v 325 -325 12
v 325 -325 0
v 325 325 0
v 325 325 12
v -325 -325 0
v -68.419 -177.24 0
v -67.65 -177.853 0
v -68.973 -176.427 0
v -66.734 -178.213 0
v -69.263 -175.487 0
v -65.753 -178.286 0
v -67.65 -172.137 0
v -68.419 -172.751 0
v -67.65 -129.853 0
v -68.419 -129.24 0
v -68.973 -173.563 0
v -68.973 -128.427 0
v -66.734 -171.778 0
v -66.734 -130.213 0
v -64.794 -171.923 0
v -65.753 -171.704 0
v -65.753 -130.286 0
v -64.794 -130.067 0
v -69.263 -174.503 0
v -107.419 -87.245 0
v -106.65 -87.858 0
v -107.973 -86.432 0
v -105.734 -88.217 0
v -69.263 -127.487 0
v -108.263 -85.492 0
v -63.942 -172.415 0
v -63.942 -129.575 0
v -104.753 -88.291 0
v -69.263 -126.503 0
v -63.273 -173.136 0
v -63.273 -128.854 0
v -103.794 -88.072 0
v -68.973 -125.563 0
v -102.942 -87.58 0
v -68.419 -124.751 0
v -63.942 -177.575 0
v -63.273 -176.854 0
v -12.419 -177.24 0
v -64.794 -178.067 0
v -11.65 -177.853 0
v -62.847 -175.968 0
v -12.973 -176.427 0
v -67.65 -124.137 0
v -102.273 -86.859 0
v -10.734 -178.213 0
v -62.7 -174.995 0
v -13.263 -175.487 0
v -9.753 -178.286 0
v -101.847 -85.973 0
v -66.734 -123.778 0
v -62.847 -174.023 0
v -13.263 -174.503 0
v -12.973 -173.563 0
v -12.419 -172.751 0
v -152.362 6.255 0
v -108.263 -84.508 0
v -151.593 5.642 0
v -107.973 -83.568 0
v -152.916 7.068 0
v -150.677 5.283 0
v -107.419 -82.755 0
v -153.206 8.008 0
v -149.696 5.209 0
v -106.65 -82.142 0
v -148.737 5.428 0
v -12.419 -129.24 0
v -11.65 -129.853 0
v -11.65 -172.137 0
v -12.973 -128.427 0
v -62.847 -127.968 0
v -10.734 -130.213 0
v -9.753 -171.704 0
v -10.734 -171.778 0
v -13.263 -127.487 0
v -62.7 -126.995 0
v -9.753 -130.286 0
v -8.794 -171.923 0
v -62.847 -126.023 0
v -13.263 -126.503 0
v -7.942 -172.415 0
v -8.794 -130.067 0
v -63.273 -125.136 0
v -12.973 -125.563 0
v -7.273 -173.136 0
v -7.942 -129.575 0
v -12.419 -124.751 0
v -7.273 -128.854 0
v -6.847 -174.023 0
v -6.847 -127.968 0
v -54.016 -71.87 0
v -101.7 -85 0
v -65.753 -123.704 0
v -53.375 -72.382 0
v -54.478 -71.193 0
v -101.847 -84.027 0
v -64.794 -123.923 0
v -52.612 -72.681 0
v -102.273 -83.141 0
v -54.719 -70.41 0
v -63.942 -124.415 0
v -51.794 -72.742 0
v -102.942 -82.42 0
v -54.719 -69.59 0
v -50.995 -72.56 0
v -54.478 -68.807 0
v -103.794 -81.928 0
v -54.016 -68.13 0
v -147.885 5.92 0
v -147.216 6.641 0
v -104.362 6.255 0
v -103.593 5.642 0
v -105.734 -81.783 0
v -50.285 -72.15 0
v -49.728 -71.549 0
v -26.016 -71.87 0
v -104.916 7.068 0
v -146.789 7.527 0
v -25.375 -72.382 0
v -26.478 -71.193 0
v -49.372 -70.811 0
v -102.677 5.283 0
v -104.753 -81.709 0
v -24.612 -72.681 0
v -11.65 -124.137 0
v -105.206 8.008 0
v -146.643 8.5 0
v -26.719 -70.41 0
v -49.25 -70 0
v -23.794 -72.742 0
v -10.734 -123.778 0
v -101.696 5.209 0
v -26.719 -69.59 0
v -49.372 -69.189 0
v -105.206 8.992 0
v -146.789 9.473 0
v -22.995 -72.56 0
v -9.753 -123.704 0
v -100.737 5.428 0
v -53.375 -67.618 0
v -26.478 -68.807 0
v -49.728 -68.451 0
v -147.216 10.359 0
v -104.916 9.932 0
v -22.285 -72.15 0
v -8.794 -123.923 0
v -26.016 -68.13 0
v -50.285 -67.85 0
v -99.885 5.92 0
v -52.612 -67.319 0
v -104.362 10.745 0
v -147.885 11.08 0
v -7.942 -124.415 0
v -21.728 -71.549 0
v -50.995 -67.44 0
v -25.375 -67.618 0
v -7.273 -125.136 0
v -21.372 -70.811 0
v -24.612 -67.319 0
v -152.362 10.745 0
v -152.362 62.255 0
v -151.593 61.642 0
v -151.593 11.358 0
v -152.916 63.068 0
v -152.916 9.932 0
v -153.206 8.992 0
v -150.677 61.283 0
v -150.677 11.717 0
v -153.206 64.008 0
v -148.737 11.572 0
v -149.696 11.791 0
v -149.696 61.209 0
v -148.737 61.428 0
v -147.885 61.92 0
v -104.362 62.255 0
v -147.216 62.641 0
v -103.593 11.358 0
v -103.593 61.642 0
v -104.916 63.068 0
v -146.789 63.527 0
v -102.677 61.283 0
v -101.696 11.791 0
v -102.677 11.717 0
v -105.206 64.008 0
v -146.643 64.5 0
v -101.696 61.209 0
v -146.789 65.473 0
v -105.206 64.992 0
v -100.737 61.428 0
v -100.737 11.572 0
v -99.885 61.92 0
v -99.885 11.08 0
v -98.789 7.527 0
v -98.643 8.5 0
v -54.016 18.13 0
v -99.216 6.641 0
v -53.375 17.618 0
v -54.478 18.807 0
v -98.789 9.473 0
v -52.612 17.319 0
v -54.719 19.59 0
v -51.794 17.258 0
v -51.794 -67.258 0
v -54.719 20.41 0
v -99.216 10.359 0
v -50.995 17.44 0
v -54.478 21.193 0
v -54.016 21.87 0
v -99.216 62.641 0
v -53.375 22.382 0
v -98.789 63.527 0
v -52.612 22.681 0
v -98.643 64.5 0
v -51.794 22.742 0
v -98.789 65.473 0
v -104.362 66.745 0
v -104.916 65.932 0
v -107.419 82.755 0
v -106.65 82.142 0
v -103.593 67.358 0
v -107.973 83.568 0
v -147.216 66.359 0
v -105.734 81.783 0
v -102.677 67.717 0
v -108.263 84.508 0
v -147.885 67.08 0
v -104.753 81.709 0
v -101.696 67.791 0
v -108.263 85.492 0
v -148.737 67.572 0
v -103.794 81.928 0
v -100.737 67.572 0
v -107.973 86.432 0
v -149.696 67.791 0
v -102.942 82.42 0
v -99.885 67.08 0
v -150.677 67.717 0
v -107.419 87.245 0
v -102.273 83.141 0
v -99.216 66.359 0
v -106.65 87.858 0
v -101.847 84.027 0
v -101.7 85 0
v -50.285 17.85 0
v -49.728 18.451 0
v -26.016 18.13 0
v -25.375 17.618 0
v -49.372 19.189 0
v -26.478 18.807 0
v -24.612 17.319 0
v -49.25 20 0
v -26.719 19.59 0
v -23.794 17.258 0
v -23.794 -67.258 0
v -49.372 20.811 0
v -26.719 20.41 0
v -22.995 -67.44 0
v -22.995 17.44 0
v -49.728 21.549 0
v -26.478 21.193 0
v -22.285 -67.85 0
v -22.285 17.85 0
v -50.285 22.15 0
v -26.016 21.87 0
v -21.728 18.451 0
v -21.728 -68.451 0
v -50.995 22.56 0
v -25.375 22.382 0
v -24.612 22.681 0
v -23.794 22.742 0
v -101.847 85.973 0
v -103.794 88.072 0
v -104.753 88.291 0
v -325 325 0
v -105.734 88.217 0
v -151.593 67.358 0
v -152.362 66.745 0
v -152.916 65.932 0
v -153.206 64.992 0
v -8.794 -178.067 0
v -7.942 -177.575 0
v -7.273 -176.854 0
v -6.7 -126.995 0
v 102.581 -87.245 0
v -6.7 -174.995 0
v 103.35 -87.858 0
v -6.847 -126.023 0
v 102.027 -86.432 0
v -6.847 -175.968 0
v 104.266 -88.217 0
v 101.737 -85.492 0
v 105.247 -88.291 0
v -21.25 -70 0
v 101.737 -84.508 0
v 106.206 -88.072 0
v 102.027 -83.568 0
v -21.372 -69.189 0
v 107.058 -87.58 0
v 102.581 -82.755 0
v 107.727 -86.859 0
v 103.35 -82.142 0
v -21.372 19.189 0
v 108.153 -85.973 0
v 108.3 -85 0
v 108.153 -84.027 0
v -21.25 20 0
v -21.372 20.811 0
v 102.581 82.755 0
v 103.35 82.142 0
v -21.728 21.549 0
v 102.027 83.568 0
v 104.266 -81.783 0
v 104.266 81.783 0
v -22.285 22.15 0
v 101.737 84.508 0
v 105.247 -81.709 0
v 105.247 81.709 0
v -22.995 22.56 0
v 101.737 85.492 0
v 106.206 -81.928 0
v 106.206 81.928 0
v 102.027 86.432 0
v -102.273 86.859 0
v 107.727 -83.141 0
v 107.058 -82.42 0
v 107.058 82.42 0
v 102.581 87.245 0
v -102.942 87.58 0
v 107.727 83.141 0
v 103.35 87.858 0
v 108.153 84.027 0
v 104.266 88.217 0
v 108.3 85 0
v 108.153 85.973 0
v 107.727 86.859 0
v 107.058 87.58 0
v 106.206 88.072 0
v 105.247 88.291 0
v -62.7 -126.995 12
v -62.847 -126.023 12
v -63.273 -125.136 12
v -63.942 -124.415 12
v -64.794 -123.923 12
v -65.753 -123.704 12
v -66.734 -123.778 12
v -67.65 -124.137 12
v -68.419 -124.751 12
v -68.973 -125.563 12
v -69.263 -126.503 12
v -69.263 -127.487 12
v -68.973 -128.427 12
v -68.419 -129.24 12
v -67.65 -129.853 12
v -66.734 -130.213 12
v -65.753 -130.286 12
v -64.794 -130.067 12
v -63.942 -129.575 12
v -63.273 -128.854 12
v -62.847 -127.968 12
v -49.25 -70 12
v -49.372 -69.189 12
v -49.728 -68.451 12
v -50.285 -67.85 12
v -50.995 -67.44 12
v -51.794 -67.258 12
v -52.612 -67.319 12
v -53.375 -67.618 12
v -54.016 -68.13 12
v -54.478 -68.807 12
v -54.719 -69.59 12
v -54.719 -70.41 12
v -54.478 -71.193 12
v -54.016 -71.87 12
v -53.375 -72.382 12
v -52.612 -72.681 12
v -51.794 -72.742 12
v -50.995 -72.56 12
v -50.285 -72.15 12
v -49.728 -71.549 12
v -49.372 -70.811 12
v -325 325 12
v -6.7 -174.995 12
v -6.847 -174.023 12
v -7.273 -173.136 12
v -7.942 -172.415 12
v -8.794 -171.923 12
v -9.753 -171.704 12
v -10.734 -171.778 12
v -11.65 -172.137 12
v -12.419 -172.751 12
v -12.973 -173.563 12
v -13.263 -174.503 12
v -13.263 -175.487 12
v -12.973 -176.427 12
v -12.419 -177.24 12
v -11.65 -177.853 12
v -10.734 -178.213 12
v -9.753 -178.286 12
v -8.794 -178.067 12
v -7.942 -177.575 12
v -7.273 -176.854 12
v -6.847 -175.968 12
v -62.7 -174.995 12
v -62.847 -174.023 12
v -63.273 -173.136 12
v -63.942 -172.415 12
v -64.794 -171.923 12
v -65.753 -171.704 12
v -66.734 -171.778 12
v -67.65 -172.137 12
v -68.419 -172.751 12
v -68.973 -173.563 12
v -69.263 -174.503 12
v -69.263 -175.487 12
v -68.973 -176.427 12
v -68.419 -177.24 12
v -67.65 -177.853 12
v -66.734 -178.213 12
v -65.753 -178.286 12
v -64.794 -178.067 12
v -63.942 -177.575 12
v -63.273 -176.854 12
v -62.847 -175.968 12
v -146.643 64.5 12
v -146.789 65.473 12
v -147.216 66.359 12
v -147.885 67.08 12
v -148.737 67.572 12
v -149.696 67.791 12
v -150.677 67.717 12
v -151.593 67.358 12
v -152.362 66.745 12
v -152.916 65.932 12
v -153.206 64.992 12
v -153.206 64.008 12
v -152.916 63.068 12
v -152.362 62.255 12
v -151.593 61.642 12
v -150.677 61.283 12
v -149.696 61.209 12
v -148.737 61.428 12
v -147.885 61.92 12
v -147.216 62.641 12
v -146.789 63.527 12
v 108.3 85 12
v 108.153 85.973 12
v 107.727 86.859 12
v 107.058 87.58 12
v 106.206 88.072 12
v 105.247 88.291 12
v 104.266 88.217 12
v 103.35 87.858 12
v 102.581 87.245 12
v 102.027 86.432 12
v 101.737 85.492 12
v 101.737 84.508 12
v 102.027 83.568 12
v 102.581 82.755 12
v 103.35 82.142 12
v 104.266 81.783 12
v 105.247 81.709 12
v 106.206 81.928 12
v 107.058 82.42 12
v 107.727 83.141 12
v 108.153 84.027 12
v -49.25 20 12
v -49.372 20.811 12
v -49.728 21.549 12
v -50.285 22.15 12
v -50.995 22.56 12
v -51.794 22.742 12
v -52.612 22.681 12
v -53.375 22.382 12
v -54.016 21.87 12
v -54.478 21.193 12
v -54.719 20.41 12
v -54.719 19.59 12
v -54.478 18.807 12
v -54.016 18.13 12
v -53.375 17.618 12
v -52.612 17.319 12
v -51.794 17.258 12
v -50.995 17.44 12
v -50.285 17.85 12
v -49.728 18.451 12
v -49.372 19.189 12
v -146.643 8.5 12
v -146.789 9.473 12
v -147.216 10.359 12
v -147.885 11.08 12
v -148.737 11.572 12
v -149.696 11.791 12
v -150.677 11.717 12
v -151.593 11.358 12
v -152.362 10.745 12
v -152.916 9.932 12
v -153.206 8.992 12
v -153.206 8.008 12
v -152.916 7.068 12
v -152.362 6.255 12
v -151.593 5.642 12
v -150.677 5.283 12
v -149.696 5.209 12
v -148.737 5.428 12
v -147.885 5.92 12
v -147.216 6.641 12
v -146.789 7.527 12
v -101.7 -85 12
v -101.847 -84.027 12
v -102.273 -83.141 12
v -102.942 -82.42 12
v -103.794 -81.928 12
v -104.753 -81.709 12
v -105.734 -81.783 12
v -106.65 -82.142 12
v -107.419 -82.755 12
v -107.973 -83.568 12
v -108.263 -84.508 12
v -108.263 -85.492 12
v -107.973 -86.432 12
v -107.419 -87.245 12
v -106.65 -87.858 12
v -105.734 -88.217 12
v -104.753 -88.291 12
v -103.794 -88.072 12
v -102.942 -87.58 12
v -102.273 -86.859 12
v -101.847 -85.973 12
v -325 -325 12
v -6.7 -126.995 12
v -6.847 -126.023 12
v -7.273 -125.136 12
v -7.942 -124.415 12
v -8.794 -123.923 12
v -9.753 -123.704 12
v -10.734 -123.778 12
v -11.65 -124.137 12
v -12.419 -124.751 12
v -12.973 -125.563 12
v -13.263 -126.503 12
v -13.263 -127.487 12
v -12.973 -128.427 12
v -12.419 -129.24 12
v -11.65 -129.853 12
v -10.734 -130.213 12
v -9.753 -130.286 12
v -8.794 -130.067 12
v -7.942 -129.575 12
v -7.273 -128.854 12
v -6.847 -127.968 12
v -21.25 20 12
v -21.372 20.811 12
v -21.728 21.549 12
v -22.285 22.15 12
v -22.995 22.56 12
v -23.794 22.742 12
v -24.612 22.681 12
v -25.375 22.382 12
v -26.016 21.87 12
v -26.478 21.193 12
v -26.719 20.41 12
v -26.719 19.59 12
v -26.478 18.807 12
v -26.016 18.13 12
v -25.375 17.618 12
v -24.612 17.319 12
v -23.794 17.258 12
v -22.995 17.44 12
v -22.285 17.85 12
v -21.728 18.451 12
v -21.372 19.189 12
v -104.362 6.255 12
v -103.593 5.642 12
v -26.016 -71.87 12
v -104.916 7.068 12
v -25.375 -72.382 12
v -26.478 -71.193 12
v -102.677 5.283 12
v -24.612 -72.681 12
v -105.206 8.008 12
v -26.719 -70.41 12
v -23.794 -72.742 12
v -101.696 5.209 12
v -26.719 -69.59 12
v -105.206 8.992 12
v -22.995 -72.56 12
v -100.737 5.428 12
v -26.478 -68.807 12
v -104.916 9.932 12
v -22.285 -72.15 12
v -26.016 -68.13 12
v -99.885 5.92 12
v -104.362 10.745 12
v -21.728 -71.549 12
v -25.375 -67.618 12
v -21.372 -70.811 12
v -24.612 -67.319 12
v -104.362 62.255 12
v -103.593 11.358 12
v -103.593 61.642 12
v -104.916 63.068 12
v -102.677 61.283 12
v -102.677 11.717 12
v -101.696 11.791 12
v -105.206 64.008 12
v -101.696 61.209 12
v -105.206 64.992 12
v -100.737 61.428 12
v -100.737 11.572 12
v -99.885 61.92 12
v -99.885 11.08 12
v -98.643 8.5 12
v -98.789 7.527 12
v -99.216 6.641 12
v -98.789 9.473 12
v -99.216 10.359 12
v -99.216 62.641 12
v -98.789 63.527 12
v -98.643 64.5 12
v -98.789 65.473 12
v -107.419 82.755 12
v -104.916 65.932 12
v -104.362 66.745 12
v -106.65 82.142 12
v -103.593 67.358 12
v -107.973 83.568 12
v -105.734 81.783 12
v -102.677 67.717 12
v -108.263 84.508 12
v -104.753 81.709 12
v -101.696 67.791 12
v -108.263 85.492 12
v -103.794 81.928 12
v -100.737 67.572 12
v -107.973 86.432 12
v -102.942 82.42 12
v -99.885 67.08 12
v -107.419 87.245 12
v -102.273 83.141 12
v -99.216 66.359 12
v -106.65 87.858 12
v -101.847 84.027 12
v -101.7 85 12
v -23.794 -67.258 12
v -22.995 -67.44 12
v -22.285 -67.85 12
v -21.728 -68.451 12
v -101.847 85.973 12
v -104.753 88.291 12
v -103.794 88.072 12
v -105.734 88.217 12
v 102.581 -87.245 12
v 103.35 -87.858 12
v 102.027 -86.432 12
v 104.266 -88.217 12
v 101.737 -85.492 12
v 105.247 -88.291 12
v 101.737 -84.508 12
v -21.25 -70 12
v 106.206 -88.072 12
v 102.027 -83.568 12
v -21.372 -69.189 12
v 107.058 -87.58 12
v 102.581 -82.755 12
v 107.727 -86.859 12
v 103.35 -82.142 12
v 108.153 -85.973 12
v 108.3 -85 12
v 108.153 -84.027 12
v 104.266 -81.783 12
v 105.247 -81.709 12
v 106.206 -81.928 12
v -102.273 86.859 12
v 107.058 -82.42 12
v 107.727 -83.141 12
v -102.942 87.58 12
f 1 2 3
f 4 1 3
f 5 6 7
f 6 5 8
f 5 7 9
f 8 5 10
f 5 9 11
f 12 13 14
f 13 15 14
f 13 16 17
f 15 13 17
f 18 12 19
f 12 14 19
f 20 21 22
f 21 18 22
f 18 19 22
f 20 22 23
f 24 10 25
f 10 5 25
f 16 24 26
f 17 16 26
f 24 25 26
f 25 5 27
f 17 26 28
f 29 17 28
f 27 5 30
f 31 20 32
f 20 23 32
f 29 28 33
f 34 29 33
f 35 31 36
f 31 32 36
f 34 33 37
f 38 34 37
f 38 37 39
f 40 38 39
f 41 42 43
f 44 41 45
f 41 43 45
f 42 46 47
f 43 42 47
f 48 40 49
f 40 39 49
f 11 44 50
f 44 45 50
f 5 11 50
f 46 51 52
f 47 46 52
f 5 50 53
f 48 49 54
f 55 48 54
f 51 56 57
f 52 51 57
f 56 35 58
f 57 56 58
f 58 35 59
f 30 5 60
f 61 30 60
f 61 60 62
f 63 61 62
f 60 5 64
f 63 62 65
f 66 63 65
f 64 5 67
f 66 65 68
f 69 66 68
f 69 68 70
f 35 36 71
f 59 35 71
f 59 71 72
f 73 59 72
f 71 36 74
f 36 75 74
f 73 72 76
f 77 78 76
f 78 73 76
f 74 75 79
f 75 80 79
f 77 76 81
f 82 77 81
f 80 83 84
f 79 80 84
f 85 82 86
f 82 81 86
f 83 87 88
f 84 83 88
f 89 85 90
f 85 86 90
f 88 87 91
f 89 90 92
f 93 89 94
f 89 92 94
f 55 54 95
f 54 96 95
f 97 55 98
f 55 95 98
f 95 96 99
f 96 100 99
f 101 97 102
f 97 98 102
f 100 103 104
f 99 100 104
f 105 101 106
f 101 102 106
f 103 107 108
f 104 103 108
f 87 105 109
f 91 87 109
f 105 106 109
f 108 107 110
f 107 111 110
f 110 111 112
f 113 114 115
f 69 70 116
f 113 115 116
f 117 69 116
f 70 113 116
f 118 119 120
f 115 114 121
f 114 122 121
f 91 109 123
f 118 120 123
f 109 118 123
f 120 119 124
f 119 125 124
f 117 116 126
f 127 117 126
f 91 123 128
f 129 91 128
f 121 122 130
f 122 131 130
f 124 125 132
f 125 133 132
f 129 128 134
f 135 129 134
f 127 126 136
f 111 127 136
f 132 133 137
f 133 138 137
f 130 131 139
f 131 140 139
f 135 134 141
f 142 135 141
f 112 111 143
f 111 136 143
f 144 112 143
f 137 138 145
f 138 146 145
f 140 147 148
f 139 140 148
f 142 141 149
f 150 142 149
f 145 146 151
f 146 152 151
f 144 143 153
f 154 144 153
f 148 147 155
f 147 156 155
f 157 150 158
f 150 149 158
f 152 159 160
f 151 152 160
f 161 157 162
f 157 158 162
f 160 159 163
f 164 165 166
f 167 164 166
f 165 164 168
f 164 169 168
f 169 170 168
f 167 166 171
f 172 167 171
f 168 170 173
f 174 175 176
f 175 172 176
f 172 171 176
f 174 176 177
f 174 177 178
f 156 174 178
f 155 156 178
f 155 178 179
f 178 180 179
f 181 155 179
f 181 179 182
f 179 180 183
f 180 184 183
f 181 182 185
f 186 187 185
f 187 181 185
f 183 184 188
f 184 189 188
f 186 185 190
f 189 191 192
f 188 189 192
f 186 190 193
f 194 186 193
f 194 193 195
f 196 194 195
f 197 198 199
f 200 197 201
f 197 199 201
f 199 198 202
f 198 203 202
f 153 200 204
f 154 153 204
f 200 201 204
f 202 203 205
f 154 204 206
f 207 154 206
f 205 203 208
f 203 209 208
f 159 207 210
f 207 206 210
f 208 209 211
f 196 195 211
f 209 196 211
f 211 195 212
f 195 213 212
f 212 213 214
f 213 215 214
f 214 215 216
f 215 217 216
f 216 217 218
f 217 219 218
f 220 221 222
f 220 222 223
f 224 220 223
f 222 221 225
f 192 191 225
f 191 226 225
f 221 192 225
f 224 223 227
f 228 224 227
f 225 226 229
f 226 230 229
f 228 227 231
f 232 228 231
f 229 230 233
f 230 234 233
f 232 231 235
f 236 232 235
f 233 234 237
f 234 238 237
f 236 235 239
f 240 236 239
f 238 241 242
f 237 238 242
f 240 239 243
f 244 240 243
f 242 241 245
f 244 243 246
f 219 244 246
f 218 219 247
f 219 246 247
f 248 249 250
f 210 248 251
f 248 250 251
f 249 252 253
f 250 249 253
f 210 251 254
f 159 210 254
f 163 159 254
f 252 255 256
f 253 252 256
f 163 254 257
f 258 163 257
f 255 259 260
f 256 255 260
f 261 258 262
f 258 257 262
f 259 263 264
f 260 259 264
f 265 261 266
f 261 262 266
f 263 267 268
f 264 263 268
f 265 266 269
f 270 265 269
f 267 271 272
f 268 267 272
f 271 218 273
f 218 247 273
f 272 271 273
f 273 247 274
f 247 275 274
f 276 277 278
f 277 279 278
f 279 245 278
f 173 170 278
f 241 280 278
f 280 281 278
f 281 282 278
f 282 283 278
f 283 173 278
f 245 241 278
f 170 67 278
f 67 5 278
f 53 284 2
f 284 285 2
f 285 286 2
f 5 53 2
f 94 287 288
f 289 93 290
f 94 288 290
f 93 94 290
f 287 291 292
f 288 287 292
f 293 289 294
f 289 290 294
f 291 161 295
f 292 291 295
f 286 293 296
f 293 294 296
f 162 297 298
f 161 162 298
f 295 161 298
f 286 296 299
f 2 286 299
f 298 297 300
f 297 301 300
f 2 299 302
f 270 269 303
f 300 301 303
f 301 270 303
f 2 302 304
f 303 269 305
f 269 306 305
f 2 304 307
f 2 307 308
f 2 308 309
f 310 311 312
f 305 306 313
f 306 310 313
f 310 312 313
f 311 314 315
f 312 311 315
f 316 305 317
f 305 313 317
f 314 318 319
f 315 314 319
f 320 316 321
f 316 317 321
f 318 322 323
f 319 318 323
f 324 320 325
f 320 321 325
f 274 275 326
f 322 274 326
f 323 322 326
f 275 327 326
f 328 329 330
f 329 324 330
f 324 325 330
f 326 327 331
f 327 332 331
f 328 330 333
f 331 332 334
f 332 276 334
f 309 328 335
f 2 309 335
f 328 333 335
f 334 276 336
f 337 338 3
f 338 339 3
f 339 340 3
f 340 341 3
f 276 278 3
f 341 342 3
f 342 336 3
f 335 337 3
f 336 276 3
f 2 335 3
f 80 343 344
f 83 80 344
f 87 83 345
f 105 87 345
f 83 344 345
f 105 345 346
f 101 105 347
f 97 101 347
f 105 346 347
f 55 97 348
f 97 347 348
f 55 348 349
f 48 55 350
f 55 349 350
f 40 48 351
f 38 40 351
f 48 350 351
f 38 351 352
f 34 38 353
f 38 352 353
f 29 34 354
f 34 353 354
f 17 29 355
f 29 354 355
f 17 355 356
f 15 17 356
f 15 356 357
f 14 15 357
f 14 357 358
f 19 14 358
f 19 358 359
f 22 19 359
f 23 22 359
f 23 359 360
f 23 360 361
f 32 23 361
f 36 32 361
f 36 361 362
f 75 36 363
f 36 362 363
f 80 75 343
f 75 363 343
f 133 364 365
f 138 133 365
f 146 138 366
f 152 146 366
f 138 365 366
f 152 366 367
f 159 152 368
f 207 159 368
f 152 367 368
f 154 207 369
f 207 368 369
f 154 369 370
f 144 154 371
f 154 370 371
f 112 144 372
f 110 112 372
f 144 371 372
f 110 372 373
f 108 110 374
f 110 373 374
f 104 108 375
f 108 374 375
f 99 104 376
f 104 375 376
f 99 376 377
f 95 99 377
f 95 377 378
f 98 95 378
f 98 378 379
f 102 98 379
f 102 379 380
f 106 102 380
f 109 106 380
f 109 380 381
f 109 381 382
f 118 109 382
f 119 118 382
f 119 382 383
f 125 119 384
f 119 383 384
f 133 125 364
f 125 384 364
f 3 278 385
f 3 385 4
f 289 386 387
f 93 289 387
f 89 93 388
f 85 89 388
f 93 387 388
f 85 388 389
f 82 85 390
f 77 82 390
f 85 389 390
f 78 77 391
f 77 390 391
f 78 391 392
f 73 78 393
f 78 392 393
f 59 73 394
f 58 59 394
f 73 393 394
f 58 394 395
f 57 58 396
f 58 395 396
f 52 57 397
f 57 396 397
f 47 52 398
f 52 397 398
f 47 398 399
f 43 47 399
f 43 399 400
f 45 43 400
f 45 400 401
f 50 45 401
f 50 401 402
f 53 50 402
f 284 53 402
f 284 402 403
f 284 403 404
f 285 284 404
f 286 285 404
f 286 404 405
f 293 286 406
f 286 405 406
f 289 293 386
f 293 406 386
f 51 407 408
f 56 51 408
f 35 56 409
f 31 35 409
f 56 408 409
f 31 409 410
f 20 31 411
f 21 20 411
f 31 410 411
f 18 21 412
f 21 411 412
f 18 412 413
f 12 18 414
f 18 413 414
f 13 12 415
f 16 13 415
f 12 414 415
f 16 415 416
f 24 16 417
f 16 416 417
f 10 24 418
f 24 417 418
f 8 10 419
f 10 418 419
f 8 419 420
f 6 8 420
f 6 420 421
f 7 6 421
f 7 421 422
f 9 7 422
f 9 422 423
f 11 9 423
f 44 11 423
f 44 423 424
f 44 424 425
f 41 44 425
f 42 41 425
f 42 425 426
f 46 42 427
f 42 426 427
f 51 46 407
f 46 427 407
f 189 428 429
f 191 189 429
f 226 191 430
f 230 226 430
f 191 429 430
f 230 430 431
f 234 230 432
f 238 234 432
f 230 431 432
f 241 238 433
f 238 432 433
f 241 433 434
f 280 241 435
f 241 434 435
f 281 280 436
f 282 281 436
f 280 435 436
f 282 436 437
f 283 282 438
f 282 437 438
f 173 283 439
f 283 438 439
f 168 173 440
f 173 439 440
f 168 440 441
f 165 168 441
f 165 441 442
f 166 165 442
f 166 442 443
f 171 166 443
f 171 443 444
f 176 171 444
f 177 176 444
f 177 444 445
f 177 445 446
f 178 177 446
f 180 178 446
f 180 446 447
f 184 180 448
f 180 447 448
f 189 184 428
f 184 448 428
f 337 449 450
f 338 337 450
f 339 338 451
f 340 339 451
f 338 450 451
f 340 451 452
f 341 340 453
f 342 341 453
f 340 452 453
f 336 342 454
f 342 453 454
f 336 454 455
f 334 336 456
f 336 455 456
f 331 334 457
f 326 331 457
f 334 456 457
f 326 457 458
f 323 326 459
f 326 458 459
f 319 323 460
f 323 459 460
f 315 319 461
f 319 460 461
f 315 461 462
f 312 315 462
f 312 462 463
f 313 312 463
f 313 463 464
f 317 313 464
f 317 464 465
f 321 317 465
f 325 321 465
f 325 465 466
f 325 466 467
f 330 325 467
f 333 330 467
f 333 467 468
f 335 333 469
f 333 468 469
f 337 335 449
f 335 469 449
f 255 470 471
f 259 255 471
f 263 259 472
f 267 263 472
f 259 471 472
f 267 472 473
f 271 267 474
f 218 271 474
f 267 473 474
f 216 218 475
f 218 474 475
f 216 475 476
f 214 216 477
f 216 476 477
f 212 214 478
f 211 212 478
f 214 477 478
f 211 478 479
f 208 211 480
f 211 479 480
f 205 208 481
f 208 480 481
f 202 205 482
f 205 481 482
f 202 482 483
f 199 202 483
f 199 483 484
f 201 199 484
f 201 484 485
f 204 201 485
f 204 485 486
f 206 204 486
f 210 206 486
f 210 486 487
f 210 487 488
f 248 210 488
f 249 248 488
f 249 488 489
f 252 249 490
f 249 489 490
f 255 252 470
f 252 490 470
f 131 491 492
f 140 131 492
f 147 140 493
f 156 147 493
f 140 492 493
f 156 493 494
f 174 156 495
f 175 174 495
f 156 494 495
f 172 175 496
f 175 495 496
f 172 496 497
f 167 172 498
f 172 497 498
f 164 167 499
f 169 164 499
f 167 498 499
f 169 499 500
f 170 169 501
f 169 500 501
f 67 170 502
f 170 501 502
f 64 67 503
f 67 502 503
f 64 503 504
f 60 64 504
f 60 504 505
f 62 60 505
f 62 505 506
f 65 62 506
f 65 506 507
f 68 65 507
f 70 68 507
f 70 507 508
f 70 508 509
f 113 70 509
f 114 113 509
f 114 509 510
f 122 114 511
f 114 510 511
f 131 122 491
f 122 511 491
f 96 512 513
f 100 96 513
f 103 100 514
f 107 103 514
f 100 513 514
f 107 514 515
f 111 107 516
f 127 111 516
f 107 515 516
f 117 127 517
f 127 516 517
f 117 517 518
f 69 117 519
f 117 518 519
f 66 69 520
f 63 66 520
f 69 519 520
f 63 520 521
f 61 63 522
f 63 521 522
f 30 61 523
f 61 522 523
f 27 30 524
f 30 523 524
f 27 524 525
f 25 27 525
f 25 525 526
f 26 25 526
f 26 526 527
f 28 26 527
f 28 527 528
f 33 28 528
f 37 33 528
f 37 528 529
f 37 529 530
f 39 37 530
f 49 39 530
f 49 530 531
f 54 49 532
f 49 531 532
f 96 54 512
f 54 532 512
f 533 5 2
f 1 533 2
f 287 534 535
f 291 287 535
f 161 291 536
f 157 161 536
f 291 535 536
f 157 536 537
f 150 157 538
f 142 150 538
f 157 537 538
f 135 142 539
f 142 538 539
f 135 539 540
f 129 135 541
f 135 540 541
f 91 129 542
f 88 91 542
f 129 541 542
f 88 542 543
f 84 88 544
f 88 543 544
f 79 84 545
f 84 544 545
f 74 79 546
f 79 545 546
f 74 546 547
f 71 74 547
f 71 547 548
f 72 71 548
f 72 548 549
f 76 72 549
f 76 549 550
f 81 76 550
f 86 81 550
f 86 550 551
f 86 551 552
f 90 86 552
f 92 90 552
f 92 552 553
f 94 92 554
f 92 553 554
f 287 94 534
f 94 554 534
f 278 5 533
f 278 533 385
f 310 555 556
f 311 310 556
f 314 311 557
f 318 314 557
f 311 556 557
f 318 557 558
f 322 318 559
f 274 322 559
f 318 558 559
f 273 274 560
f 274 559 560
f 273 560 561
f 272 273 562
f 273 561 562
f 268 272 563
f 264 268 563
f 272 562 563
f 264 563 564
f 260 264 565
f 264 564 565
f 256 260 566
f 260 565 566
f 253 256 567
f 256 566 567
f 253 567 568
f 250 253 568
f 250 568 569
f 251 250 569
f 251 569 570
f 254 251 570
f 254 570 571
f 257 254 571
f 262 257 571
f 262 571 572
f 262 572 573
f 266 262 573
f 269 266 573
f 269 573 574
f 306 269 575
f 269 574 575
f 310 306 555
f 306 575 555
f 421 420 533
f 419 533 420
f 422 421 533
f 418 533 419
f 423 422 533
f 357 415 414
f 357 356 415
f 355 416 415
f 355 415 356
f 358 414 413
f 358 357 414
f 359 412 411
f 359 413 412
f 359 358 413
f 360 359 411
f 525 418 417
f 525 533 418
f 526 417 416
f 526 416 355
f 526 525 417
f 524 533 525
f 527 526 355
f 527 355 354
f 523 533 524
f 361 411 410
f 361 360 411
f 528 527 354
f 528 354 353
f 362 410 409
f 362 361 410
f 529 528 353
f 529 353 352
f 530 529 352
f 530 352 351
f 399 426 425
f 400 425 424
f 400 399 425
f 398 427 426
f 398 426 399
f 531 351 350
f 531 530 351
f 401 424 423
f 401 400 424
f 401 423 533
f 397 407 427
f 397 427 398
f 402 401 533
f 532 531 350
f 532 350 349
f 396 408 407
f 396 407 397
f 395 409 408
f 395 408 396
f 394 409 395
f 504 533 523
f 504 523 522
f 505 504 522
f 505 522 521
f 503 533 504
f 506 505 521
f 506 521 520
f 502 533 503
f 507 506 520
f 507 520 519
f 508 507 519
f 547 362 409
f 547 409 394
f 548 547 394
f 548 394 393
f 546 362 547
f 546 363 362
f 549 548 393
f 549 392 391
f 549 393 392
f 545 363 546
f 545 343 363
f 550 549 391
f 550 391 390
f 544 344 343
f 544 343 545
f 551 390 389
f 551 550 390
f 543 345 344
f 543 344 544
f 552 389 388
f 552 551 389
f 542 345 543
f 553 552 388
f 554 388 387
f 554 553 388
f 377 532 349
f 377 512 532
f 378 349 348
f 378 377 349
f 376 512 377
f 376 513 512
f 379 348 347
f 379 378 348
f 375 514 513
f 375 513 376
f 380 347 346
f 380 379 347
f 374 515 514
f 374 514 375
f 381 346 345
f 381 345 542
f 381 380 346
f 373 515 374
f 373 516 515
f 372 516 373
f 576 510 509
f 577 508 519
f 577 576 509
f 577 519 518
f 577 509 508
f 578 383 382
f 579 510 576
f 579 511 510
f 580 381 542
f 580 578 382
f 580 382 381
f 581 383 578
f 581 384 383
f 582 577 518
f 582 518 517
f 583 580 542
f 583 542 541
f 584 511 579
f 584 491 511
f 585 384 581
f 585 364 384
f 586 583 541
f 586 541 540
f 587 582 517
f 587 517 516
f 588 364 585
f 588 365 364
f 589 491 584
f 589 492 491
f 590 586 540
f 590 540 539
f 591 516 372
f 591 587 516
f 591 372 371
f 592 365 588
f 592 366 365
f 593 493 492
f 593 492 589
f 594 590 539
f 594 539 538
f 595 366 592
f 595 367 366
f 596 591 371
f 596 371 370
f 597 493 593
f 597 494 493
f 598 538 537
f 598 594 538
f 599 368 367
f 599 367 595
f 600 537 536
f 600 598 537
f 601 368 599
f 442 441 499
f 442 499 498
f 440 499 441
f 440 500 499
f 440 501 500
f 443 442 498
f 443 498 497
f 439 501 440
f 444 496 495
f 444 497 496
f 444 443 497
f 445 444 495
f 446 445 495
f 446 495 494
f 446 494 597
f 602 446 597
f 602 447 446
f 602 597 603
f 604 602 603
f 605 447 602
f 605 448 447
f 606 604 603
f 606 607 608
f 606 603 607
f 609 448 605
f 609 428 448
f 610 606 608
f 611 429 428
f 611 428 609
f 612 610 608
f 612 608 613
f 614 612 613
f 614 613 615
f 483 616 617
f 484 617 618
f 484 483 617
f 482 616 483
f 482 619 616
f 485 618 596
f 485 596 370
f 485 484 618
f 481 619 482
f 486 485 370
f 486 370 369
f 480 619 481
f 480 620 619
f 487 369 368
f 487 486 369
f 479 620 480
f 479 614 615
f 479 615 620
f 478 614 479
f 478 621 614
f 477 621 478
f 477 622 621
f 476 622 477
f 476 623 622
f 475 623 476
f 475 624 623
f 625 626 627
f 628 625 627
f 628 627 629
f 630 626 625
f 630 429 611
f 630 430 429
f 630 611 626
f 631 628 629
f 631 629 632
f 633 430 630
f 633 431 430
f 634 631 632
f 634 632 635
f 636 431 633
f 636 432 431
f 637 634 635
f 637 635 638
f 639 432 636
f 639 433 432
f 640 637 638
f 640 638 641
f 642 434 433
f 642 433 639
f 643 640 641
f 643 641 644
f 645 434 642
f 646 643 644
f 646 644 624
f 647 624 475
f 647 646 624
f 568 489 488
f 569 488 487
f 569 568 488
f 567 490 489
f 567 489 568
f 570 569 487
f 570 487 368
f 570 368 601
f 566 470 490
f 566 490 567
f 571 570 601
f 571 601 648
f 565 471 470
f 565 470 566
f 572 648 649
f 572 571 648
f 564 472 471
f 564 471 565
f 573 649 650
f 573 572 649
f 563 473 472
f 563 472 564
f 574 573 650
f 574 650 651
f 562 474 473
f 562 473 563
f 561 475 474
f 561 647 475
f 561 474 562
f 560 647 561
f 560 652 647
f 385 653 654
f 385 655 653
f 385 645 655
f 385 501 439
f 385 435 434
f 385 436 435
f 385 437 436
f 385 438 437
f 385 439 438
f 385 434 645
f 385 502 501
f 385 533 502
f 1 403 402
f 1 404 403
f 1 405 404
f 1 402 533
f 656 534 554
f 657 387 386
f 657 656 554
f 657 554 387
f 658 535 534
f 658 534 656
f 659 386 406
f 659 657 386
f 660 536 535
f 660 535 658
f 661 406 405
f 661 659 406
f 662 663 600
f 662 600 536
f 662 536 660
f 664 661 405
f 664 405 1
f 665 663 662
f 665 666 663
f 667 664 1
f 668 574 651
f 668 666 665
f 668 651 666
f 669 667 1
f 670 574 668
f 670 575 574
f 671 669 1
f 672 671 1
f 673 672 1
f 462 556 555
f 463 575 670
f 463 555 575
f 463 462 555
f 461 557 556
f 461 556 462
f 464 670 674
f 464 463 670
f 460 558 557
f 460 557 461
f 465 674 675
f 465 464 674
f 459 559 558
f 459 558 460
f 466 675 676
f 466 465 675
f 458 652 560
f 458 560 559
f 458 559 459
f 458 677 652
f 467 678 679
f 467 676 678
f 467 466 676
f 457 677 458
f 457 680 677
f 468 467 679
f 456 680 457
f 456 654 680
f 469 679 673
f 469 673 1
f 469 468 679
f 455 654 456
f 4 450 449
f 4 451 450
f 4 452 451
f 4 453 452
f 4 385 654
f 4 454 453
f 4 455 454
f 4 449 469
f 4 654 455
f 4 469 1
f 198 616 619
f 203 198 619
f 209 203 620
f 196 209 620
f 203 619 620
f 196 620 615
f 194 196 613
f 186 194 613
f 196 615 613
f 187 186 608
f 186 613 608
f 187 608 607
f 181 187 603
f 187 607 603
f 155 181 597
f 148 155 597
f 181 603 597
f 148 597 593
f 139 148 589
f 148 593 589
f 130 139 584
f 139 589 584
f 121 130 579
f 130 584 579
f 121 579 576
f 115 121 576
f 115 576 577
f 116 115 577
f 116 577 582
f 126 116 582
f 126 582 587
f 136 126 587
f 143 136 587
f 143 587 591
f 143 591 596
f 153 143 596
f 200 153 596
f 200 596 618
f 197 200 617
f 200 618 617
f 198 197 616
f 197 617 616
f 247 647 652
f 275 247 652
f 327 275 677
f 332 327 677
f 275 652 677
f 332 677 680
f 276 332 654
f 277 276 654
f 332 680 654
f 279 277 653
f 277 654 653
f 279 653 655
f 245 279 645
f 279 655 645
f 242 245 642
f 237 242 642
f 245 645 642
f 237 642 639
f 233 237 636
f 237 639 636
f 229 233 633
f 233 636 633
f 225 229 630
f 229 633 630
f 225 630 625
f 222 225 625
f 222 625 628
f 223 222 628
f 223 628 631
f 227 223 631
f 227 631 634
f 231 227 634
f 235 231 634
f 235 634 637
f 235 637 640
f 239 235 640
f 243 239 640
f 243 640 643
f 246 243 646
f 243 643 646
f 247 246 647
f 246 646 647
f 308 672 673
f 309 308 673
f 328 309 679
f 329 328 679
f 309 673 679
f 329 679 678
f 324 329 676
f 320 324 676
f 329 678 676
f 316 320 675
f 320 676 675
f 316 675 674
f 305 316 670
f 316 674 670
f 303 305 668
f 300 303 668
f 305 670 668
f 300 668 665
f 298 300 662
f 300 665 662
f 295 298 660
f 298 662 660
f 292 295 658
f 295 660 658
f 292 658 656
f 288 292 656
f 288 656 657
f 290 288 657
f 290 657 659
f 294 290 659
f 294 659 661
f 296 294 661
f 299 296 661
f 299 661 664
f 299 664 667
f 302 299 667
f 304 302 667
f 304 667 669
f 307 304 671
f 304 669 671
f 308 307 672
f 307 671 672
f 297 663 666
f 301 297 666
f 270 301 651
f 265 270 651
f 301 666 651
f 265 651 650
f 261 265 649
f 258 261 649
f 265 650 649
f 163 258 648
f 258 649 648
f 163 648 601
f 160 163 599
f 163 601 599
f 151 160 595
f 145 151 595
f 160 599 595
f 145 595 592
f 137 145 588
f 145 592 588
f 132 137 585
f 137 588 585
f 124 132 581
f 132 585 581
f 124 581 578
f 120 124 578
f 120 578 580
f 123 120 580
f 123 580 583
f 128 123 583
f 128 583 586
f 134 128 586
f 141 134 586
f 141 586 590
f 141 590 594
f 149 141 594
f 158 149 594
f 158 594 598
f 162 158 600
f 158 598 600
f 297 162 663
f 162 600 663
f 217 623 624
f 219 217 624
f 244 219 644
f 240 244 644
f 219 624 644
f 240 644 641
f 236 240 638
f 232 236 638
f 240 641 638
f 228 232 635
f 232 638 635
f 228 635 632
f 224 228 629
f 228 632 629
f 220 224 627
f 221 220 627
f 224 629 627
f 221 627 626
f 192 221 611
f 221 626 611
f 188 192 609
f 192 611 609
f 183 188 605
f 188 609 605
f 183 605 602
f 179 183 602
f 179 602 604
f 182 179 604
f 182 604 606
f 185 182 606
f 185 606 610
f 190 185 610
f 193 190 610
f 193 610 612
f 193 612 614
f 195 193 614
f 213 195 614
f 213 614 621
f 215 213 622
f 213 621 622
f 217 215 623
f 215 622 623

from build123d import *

# Parameters (mm, degrees)
SKETCH1_W                                = 650
SKETCH1_H                                = 650
BENCH_PLATE_DEPTH                        = 12
SKETCH2_R                                = 3.3
BENCH_M6_ANCHOR_HOLES_12X_D6P6_DEPTH     = 12
SKETCH3_R                                = 2.75
BENCH_M5_SUPPORTPOST_HOLES_4X_D5P5_DEPTH = 12


with BuildPart() as part:
    # Sketch1 → Bench_Plate (new body)
    with BuildSketch(Plane.XY):
        Rectangle(SKETCH1_W, SKETCH1_H)
    extrude(amount=BENCH_PLATE_DEPTH)

    # Sketch2 → Bench_M6_Anchor_Holes_12x_D6p6 (cut)
    with BuildSketch(Plane.XY.offset(12)):
        with Locations((-105, -85)):
            Circle(SKETCH2_R)
        with Locations((-105, 85)):
            Circle(SKETCH2_R)
        with Locations((105, -85)):
            Circle(SKETCH2_R)
        with Locations((105, 85)):
            Circle(SKETCH2_R)
        with Locations((-149.942838923, 8.5)):
            Circle(SKETCH2_R)
        with Locations((-101.942838923, 8.5)):
            Circle(SKETCH2_R)
        with Locations((-149.942838923, 64.5)):
            Circle(SKETCH2_R)
        with Locations((-101.942838923, 64.5)):
            Circle(SKETCH2_R)
        with Locations((-10, -174.995245402)):
            Circle(SKETCH2_R)
        with Locations((-10, -126.995245402)):
            Circle(SKETCH2_R)
        with Locations((-66, -174.995245402)):
            Circle(SKETCH2_R)
        with Locations((-66, -126.995245402)):
            Circle(SKETCH2_R)
    extrude(amount=-BENCH_M6_ANCHOR_HOLES_12X_D6P6_DEPTH, mode=Mode.SUBTRACT)

    # Sketch3 → Bench_M5_SupportPost_Holes_4x_D5p5 (cut)
    with BuildSketch(Plane.XY.offset(12)):
        with Locations((-52, -70)):
            Circle(SKETCH3_R)
        with Locations((-52, 20)):
            Circle(SKETCH3_R)
        with Locations((-24, -70)):
            Circle(SKETCH3_R)
        with Locations((-24, 20)):
            Circle(SKETCH3_R)
    extrude(amount=-BENCH_M5_SUPPORTPOST_HOLES_4X_D5P5_DEPTH, mode=Mode.SUBTRACT)


solid = part.part
